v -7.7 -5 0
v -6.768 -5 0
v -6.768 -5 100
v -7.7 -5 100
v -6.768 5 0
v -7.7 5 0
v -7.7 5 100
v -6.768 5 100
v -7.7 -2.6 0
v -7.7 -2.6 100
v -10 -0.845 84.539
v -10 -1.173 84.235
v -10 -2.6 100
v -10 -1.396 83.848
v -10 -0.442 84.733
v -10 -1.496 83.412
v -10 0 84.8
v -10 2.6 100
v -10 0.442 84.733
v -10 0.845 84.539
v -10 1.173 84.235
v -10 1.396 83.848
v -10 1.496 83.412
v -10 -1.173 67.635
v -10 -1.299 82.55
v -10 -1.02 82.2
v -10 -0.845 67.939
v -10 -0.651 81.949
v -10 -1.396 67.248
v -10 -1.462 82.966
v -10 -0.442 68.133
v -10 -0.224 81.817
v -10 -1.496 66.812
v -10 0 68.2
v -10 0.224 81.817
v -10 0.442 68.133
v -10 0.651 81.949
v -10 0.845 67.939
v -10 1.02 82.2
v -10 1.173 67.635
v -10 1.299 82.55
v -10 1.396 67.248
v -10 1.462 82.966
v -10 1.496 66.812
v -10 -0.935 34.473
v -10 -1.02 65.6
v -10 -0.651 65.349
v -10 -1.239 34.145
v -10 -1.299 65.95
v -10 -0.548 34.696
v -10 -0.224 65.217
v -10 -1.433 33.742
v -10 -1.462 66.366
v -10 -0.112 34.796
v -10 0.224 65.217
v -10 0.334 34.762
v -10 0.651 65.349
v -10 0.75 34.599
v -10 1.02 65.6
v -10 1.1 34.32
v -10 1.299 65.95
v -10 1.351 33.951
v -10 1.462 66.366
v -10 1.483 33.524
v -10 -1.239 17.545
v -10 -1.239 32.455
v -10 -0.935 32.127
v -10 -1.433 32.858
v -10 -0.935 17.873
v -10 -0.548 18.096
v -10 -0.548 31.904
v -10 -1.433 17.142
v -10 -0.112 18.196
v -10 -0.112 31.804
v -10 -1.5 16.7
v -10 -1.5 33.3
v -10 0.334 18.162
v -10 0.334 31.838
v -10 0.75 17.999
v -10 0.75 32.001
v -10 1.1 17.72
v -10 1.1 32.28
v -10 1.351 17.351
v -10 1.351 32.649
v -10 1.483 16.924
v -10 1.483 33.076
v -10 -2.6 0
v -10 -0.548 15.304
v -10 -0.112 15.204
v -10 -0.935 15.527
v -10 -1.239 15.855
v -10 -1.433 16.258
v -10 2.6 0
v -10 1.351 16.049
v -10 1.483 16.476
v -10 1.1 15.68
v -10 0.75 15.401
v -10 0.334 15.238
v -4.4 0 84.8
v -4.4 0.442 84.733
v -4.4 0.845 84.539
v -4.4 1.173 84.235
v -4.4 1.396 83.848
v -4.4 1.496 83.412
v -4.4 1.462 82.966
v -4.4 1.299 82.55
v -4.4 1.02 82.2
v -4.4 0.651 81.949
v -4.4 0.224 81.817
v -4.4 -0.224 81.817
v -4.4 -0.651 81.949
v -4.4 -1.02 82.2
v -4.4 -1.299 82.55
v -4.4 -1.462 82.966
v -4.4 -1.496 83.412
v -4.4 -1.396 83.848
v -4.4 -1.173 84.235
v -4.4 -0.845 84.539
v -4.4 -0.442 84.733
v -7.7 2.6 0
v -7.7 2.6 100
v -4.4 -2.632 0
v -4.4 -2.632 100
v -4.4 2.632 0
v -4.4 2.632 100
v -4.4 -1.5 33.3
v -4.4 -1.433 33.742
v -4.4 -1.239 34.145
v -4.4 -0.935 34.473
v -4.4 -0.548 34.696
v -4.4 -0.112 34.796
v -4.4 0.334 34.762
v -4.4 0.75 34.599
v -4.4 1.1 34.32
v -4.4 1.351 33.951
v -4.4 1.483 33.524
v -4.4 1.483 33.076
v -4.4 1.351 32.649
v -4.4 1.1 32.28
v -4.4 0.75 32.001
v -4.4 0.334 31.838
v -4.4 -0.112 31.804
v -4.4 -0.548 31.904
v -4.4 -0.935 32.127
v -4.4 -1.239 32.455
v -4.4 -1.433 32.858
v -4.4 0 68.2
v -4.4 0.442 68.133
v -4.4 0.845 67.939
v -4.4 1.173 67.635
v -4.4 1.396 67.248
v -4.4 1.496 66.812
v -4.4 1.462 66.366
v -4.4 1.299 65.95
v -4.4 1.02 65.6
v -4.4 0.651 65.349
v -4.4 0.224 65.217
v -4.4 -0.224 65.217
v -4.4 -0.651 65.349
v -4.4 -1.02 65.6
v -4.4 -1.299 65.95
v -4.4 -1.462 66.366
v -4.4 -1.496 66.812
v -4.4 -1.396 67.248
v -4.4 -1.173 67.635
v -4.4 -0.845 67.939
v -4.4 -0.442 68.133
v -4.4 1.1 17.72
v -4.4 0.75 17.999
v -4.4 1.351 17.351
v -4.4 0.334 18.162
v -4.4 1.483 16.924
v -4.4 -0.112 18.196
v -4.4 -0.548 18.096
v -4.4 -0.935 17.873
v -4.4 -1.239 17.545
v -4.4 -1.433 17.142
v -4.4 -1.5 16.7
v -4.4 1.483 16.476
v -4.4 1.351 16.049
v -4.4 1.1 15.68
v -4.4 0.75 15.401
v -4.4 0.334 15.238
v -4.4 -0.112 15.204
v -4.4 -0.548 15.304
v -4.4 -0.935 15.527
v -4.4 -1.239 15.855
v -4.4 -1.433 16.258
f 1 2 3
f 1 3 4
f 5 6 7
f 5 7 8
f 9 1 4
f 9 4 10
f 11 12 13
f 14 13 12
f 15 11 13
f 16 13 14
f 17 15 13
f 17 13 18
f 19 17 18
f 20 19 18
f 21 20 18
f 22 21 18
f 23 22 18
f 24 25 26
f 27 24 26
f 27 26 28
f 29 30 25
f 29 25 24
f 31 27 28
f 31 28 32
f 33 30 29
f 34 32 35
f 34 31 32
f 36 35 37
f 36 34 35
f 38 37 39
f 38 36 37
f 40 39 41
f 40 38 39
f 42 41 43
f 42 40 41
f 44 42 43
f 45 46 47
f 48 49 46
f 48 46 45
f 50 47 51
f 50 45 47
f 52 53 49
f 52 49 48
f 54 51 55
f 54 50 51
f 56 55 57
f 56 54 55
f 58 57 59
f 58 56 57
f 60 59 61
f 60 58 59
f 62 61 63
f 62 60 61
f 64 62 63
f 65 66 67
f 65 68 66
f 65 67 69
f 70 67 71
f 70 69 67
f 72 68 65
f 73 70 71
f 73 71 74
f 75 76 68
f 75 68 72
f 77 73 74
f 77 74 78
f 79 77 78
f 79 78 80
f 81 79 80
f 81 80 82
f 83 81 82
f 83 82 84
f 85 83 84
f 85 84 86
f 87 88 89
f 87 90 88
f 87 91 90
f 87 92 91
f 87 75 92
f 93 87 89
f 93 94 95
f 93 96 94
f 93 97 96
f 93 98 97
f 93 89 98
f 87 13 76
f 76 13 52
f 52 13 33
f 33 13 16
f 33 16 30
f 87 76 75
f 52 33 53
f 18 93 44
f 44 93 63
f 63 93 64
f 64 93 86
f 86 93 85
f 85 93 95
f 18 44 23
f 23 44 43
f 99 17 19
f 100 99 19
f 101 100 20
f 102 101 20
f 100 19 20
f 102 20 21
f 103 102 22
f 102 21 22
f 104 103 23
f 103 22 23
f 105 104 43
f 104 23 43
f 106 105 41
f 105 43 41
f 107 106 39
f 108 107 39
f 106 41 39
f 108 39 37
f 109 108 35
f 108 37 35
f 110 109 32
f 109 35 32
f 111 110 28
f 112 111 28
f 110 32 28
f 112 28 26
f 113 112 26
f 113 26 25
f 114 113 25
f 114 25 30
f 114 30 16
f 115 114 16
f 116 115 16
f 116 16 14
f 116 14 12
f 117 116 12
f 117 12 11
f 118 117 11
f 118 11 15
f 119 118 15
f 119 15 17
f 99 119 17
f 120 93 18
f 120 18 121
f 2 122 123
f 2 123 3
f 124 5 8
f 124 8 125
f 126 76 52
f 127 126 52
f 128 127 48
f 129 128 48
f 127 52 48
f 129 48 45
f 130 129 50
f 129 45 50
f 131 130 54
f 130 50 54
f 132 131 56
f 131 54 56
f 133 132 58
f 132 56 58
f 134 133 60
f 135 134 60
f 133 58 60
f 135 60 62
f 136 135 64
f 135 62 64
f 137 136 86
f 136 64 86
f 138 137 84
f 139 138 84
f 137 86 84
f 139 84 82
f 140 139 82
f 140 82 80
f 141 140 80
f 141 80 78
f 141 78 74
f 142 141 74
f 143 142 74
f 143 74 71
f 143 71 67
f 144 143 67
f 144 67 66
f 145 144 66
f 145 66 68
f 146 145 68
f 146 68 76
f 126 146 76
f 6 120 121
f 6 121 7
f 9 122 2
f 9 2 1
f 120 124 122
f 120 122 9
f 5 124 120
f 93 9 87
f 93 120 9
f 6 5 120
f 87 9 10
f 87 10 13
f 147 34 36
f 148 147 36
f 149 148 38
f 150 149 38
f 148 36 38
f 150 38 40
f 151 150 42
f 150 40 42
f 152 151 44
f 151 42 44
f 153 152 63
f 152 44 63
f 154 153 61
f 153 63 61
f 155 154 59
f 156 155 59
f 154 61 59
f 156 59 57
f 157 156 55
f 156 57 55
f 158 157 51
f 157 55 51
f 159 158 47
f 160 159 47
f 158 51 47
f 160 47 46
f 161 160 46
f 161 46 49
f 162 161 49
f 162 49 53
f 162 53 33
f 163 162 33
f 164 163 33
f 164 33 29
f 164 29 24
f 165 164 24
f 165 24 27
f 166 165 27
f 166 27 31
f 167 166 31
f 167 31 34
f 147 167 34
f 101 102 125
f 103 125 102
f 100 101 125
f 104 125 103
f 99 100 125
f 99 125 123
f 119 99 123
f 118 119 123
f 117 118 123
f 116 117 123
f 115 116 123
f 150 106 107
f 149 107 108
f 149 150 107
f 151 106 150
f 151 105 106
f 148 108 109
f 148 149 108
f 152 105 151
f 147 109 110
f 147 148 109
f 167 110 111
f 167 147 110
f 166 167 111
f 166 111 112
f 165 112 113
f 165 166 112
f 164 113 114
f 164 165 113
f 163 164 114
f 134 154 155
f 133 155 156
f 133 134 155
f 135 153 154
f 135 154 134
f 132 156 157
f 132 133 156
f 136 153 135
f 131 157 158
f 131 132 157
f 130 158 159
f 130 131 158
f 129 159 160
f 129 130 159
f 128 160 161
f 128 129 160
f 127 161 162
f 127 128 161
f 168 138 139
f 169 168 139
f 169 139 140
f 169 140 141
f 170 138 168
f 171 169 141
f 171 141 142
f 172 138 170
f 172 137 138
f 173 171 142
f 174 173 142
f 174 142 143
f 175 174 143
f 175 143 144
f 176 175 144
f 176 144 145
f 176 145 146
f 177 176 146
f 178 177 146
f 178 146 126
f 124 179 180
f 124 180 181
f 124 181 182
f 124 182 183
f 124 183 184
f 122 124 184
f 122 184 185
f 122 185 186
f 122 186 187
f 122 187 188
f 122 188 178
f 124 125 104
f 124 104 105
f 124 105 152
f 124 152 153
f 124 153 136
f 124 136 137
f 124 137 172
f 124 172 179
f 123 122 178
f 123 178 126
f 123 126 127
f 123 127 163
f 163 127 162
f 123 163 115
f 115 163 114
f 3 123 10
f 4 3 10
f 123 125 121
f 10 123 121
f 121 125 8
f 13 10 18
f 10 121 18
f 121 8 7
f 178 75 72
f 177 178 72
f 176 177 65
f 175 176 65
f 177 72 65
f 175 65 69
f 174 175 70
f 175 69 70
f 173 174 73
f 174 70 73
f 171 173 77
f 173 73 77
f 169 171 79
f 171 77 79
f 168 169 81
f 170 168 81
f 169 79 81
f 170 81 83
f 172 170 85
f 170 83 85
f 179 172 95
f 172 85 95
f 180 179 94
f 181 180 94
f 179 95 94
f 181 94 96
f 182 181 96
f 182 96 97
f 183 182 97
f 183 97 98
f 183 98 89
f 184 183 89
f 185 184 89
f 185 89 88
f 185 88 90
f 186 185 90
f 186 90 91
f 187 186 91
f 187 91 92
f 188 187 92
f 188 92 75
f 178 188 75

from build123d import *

# Parameters (mm, degrees)
BOSS_EXTRUDE1_DEPTH = 100
SKETCH2_R           = 1.5
CUT_EXTRUDE1_DEPTH  = 20


with BuildPart() as part:
    # Sketch1 → Boss-Extrude1 (new body)
    with BuildSketch(Plane.XY):
        Polygon((-10, 2.6), (-7.7, 2.6), (-7.7, 5), (-6.767766953, 5), (-4.4, 2.632233047), (-4.4, -2.632233047), (-6.767766953, -5), (-7.7, -5), (-7.7, -2.6), (-10, -2.6), align=None)
    extrude(amount=BOSS_EXTRUDE1_DEPTH)

    # Sketch2 → Cut-Extrude1 (cut)
    with BuildSketch(Plane.ZY.offset(10)):
        with Locations((83.3, 0)):
            Circle(SKETCH2_R)
        with Locations((66.7, 0)):
            Circle(SKETCH2_R)
        with Locations(Location((16.7, 0, 0), (0, 0, 270))):
            Circle(SKETCH2_R)
        with Locations(Location((33.3, 0, 0), (0, 0, 270))):
            Circle(SKETCH2_R)
    extrude(amount=-CUT_EXTRUDE1_DEPTH, mode=Mode.SUBTRACT)


solid = part.part
